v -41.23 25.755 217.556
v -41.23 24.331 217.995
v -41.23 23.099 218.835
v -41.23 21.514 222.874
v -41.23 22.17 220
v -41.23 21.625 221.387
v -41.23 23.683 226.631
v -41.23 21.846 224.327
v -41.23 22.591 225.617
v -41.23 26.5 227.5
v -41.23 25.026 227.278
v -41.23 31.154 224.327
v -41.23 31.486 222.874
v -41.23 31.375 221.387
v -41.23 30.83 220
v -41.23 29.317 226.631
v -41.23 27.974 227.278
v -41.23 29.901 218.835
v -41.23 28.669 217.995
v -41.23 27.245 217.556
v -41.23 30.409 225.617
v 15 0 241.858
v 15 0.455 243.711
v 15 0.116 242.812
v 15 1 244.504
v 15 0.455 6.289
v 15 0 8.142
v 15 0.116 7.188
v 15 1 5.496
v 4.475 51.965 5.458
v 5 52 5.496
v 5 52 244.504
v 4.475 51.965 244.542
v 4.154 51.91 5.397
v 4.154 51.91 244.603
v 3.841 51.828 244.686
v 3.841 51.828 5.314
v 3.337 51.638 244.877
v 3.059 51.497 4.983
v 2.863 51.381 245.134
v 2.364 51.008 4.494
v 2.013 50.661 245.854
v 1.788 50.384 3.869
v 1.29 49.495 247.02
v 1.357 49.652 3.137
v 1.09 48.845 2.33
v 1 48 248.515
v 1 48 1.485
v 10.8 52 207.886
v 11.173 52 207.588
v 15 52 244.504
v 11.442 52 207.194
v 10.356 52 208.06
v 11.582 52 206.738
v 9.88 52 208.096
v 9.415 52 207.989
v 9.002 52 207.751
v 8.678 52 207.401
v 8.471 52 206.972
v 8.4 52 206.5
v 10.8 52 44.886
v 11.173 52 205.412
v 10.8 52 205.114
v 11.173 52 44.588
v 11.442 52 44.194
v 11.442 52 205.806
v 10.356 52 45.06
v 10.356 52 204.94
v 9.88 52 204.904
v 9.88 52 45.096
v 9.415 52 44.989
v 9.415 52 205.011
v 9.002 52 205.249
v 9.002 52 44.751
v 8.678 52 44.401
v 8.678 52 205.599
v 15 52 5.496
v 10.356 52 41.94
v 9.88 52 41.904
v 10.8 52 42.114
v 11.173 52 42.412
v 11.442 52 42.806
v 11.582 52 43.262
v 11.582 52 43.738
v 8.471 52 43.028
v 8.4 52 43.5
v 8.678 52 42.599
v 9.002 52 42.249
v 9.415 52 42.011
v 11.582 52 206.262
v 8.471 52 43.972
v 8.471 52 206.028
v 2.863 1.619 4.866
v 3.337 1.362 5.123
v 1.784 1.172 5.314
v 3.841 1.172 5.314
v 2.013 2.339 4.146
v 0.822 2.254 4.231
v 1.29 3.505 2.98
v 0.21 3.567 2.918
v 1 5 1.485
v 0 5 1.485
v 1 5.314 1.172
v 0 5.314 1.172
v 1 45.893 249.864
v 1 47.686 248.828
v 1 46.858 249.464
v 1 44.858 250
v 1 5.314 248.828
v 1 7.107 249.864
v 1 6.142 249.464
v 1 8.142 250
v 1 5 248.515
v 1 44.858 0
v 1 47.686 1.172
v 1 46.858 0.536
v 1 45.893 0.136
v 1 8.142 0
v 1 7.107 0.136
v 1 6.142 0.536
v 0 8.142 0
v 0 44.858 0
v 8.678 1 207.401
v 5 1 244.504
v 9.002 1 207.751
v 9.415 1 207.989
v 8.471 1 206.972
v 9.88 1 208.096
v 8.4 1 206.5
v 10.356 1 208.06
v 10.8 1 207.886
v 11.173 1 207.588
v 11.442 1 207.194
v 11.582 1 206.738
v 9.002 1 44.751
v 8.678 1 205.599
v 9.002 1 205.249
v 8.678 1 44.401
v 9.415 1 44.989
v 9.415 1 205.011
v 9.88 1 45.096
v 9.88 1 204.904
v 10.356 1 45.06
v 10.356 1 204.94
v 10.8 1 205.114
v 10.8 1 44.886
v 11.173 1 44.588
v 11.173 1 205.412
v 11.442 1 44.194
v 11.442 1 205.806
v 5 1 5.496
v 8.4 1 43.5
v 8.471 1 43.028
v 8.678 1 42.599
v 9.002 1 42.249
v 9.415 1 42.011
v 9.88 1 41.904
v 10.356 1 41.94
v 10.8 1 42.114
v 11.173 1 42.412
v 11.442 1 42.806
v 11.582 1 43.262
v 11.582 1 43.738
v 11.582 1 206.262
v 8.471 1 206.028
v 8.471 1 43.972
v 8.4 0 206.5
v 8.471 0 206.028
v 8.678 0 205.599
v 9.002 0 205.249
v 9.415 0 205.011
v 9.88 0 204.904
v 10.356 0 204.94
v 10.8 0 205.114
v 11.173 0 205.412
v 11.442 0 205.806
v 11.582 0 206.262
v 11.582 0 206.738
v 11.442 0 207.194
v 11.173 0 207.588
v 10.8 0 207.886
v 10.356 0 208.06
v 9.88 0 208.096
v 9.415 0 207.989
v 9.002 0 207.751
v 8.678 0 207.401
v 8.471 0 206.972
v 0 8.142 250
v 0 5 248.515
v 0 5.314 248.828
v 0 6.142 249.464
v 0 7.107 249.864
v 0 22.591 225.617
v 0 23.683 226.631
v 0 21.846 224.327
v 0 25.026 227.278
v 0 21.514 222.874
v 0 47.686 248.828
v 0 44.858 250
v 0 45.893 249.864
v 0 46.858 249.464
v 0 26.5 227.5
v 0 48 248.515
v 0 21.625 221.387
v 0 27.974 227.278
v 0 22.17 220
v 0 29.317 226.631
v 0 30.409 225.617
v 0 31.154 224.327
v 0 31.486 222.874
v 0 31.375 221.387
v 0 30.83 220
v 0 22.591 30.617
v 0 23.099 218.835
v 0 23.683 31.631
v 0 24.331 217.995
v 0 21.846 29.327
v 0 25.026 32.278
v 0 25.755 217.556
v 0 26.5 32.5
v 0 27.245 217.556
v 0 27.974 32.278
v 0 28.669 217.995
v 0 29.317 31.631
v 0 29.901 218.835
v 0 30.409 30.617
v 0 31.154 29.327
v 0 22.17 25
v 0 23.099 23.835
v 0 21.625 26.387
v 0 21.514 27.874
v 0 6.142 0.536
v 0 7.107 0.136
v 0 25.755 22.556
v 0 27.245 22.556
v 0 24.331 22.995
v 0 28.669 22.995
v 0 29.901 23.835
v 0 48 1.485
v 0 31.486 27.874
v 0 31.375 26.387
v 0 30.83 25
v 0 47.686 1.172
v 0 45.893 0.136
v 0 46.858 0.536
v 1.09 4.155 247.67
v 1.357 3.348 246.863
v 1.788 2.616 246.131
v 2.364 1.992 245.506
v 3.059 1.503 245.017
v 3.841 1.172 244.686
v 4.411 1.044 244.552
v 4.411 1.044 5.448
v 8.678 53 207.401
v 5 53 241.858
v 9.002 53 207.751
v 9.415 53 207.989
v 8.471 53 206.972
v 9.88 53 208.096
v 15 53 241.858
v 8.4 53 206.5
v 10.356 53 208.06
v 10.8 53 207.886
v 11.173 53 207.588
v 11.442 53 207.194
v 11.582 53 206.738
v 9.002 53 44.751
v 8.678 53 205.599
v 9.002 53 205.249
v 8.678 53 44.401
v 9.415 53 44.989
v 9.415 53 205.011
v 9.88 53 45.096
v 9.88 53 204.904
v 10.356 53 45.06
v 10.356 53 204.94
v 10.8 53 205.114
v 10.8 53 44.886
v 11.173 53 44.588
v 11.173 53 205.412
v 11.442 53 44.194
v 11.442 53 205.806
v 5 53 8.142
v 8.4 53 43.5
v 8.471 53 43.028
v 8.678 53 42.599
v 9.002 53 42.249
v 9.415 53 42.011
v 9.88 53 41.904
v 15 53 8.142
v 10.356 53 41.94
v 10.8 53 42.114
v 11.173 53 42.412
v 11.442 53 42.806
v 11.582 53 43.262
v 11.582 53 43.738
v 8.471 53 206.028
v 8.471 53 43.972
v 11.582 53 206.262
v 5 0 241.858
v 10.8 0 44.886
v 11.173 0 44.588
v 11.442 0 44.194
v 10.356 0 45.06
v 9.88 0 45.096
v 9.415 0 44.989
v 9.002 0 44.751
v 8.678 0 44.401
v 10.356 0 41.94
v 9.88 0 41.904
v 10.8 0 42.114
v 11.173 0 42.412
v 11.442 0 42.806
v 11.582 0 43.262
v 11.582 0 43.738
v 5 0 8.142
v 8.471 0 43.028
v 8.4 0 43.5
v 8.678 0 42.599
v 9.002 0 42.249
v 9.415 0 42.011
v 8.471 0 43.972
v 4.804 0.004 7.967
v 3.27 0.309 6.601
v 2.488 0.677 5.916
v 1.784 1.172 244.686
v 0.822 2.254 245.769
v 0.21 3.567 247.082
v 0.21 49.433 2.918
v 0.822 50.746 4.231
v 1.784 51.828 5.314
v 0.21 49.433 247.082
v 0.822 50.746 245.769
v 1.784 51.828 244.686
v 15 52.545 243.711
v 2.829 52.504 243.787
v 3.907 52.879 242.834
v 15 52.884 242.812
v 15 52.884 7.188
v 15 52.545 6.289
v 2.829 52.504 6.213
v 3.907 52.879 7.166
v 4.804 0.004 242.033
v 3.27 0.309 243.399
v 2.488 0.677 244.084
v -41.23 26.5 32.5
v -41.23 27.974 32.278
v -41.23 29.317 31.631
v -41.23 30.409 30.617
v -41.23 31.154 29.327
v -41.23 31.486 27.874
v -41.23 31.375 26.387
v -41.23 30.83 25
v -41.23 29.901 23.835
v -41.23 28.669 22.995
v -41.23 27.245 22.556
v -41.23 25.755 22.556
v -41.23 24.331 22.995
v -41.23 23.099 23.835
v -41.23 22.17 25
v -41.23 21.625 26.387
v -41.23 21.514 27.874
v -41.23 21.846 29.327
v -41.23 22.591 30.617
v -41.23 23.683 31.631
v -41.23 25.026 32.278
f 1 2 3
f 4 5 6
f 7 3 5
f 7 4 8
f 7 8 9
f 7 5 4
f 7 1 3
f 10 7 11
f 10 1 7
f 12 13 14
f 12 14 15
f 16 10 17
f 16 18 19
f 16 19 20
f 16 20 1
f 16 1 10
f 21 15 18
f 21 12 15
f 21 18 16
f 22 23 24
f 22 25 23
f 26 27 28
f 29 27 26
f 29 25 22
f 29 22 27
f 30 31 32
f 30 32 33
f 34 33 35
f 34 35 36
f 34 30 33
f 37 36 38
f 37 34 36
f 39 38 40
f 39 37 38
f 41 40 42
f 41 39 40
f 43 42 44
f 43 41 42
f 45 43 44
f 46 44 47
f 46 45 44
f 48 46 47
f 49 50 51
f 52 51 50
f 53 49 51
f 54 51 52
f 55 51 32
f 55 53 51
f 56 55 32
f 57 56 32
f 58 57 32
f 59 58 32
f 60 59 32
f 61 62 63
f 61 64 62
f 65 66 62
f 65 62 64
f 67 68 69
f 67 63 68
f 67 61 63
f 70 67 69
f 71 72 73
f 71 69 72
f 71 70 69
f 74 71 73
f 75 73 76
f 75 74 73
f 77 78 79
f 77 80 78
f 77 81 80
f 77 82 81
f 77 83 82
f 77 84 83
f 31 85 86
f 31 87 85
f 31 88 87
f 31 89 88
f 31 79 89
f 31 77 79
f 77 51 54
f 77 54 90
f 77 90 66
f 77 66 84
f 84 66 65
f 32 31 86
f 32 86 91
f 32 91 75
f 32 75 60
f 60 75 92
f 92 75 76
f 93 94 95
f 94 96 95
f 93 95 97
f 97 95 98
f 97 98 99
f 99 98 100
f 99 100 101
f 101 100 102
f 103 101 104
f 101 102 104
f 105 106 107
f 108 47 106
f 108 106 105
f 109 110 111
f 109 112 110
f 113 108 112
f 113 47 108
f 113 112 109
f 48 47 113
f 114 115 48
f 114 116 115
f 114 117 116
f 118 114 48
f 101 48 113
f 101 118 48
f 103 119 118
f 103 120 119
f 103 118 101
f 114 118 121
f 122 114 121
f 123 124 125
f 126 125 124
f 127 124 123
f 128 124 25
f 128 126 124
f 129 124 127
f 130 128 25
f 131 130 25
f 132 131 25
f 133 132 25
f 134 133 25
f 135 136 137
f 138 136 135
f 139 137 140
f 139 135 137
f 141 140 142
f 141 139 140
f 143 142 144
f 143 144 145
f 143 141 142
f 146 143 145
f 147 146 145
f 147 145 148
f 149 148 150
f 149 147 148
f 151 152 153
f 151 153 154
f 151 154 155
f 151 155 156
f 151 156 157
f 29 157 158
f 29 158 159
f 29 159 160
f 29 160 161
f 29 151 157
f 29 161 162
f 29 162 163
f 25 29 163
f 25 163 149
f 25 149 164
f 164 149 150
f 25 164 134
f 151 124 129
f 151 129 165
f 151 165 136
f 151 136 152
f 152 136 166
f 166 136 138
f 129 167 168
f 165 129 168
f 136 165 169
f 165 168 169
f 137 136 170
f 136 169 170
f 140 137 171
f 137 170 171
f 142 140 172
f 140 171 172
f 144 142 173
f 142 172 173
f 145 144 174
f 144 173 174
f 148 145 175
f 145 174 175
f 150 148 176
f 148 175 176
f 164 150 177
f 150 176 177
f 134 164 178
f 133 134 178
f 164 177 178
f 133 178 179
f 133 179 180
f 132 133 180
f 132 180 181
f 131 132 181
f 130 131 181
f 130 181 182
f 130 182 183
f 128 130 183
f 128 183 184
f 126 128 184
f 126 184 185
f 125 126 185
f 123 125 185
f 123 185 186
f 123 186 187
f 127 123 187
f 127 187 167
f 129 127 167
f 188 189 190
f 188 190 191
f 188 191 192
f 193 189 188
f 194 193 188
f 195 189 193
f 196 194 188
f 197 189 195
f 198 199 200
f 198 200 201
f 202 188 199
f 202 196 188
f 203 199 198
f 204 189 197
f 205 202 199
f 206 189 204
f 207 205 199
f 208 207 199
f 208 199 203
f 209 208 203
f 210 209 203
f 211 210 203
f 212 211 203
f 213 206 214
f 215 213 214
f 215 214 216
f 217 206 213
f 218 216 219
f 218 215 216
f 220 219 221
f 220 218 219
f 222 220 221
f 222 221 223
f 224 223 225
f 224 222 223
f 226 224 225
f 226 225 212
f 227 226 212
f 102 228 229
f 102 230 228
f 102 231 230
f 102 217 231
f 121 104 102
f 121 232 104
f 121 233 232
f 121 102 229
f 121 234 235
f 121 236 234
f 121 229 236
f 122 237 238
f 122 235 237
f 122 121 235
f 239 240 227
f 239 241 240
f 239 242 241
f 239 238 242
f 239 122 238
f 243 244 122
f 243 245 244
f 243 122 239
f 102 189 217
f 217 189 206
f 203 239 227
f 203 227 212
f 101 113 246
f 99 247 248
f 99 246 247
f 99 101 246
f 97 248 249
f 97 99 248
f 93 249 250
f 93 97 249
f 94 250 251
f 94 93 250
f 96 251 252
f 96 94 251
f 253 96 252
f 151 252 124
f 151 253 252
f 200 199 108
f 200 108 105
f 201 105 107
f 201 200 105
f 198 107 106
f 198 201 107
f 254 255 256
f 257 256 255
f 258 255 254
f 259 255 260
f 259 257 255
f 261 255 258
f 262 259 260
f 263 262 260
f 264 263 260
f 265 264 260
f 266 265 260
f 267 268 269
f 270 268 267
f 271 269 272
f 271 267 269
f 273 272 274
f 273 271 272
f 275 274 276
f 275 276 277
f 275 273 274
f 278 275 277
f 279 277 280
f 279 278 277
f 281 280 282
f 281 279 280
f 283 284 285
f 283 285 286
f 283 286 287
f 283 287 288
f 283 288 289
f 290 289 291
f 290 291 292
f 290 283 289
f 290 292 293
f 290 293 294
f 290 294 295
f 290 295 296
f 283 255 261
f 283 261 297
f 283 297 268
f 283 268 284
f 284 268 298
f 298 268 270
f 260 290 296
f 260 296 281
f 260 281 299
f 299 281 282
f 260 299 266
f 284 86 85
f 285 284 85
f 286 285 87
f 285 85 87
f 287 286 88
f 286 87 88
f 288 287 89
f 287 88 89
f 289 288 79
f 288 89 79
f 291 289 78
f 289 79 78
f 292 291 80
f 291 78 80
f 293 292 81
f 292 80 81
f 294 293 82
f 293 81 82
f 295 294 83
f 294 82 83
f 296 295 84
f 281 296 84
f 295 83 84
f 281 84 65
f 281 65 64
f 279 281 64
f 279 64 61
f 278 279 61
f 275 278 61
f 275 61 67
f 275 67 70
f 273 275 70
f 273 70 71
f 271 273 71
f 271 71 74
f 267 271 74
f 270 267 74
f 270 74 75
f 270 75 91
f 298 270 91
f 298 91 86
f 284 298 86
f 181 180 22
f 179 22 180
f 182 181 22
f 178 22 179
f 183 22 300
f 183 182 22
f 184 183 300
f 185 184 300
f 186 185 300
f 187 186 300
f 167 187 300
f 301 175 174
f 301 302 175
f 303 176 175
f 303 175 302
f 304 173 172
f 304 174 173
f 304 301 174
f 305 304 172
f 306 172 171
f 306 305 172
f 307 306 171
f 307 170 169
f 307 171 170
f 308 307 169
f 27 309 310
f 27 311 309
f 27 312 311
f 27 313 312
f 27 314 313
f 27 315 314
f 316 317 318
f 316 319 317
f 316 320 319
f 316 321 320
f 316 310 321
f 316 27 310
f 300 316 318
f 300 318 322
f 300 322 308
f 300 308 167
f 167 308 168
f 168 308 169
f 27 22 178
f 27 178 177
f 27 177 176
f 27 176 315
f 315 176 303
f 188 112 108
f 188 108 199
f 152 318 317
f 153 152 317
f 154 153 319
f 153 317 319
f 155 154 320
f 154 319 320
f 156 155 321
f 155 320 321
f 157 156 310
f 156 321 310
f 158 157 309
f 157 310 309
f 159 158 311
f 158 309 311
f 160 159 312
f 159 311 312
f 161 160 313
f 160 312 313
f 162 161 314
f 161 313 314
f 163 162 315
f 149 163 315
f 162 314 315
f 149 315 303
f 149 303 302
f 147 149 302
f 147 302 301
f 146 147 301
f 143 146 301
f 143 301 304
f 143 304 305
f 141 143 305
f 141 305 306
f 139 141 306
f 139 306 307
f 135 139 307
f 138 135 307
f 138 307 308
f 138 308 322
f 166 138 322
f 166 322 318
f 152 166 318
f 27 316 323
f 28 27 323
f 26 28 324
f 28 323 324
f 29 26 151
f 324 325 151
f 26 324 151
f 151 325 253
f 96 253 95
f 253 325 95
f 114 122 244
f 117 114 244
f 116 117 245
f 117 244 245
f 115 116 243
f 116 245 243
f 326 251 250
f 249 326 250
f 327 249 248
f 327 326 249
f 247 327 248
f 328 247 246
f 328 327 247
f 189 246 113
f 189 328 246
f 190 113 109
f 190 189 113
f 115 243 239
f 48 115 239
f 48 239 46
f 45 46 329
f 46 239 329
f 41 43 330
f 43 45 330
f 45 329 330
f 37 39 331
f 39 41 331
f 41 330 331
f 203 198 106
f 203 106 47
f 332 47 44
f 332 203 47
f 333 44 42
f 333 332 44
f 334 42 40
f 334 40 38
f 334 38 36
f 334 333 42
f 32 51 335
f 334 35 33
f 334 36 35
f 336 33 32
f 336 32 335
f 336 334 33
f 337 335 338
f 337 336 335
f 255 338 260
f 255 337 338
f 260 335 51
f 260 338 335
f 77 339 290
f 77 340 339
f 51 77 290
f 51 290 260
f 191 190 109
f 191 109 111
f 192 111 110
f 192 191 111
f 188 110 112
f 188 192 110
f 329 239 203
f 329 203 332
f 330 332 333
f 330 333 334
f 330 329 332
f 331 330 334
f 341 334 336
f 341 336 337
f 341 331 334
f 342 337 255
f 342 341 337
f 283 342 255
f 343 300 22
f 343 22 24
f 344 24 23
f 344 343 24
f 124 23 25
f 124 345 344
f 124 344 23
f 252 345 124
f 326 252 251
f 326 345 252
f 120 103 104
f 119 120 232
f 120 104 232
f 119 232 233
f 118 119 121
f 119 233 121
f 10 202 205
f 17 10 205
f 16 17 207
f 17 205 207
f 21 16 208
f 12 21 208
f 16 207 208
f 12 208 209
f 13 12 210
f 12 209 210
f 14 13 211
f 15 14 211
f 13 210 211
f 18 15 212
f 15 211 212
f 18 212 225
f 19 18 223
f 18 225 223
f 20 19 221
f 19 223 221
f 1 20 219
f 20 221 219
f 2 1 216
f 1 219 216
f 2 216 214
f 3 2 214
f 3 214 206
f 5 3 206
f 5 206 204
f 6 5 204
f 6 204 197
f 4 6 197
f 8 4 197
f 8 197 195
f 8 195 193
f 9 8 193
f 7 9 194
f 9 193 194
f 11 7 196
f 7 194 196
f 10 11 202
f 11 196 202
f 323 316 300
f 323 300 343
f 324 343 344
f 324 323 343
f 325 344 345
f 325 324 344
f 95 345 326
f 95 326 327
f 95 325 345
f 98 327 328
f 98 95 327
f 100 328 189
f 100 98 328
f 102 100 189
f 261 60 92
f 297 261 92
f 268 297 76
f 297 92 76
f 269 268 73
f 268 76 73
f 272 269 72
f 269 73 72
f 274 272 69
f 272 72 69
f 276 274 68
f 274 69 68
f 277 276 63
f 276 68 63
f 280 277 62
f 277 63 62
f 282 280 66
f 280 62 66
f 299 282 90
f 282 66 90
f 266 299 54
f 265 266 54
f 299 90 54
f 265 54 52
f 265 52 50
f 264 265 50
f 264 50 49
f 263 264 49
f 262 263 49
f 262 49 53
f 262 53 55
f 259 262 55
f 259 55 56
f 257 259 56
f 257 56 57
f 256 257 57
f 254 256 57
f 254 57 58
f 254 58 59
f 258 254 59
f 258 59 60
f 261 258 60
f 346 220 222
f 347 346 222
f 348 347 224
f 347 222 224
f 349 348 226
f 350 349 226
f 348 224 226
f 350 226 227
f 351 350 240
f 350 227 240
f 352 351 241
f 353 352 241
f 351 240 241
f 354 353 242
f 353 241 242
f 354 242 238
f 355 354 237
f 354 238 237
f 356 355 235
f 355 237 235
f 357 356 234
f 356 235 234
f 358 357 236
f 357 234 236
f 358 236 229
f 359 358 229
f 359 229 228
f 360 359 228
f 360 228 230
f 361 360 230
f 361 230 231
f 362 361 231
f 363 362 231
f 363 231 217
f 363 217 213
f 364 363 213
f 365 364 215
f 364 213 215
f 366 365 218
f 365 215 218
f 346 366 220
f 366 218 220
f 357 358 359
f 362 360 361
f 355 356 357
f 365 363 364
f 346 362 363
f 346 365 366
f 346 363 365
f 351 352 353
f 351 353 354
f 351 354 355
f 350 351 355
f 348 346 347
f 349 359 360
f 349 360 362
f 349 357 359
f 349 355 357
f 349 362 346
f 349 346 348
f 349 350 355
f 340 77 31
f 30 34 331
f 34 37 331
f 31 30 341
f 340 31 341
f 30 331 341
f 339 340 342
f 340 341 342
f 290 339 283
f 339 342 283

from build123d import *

# Parameters (mm, degrees)
BOSS_EXTRU_1_DEPTH      = 250
ENL_V_MAT_EXTRU_1_DEPTH = 16
D_GAGEMENT_M31_D        = 3.2
ESQUISSE6_R             = 5
BOSS_EXTRU_2_DEPTH      = 41.23


with BuildPart() as part:
    # Esquisse1 → Boss.-Extru.1 (new body)
    with BuildSketch(Plane.XY):
        with BuildLine():
            Line((0, 5), (0, 48))
            ThreePointArc((0, 48), (1.464466094, 51.535533906), (5, 53))
            Line((5, 53), (15, 53))
            Line((15, 53), (15, 52))
            Line((15, 52), (5, 52))
            ThreePointArc((5, 52), (2.171572875, 50.828427125), (1, 48))
            Line((1, 48), (1, 5))
            ThreePointArc((1, 5), (2.171572875, 2.171572875), (5, 1))
            Line((5, 1), (15, 1))
            Line((15, 1), (15, 0))
            Line((15, 0), (5, 0))
            ThreePointArc((5, 0), (1.464466094, 1.464466094), (0, 5))
        make_face()
    extrude(amount=BOSS_EXTRU_1_DEPTH)

    # Esquisse5 → Enlèv. mat.-Extru.1 (cut, through all)
    with BuildSketch(Plane.ZY):
        with BuildLine():
            Line((0, 8.142135624), (0, -1))
            Line((0, -1), (21.071067812, -1))
            Line((21.071067812, -1), (21.071067812, 0))
            Line((21.071067812, 0), (8.142135624, 0))
            ThreePointArc((8.142135624, 0), (6.611401894, 0.30448187), (5.313708499, 1.171572875))
            Line((5.313708499, 1.171572875), (1.171572875, 5.313708499))
            ThreePointArc((1.171572875, 5.313708499), (0.30448187, 6.611401894), (0, 8.142135624))
        make_face()
        with BuildLine():
            Line((8.142135624, 53), (21.071067812, 53))
            Line((21.071067812, 53), (21.071067812, 54))
            Line((21.071067812, 54), (0, 54))
            Line((0, 54), (0, 44.857864376))
            ThreePointArc((0, 44.857864376), (0.30448187, 46.388598106), (1.171572875, 47.686291501))
            Line((1.171572875, 47.686291501), (5.313708499, 51.828427125))
            ThreePointArc((5.313708499, 51.828427125), (6.611401894, 52.69551813), (8.142135624, 53))
        make_face()
    enl_v_mat_extru_1 = extrude(amount=-ENL_V_MAT_EXTRU_1_DEPTH, mode=Mode.SUBTRACT)

    # Symétrie1: Enlèv. mat.-Extru.1 across plane
    add(enl_v_mat_extru_1.mirror(Plane(origin=(0, 0, 125), x_dir=(1, 0, 0), z_dir=(0, 0, -1))), mode=Mode.SUBTRACT)

    # Dégagement M31 (through all)
    with Locations(Plane(origin=(0, 53, 0), x_dir=(1, 0, 0), z_dir=(0, 1, 0))):
        with Locations((10, -43.5), (10, -206.5)):
            Hole(D_GAGEMENT_M31_D / 2)

    # Esquisse6 → Boss.-Extru.2 (add)
    with BuildSketch(Plane.ZY):
        with Locations((27.5, 26.5)):
            Circle(ESQUISSE6_R)
        with Locations((222.5, 26.5)):
            Circle(ESQUISSE6_R)
    extrude(amount=BOSS_EXTRU_2_DEPTH)


solid = part.part
